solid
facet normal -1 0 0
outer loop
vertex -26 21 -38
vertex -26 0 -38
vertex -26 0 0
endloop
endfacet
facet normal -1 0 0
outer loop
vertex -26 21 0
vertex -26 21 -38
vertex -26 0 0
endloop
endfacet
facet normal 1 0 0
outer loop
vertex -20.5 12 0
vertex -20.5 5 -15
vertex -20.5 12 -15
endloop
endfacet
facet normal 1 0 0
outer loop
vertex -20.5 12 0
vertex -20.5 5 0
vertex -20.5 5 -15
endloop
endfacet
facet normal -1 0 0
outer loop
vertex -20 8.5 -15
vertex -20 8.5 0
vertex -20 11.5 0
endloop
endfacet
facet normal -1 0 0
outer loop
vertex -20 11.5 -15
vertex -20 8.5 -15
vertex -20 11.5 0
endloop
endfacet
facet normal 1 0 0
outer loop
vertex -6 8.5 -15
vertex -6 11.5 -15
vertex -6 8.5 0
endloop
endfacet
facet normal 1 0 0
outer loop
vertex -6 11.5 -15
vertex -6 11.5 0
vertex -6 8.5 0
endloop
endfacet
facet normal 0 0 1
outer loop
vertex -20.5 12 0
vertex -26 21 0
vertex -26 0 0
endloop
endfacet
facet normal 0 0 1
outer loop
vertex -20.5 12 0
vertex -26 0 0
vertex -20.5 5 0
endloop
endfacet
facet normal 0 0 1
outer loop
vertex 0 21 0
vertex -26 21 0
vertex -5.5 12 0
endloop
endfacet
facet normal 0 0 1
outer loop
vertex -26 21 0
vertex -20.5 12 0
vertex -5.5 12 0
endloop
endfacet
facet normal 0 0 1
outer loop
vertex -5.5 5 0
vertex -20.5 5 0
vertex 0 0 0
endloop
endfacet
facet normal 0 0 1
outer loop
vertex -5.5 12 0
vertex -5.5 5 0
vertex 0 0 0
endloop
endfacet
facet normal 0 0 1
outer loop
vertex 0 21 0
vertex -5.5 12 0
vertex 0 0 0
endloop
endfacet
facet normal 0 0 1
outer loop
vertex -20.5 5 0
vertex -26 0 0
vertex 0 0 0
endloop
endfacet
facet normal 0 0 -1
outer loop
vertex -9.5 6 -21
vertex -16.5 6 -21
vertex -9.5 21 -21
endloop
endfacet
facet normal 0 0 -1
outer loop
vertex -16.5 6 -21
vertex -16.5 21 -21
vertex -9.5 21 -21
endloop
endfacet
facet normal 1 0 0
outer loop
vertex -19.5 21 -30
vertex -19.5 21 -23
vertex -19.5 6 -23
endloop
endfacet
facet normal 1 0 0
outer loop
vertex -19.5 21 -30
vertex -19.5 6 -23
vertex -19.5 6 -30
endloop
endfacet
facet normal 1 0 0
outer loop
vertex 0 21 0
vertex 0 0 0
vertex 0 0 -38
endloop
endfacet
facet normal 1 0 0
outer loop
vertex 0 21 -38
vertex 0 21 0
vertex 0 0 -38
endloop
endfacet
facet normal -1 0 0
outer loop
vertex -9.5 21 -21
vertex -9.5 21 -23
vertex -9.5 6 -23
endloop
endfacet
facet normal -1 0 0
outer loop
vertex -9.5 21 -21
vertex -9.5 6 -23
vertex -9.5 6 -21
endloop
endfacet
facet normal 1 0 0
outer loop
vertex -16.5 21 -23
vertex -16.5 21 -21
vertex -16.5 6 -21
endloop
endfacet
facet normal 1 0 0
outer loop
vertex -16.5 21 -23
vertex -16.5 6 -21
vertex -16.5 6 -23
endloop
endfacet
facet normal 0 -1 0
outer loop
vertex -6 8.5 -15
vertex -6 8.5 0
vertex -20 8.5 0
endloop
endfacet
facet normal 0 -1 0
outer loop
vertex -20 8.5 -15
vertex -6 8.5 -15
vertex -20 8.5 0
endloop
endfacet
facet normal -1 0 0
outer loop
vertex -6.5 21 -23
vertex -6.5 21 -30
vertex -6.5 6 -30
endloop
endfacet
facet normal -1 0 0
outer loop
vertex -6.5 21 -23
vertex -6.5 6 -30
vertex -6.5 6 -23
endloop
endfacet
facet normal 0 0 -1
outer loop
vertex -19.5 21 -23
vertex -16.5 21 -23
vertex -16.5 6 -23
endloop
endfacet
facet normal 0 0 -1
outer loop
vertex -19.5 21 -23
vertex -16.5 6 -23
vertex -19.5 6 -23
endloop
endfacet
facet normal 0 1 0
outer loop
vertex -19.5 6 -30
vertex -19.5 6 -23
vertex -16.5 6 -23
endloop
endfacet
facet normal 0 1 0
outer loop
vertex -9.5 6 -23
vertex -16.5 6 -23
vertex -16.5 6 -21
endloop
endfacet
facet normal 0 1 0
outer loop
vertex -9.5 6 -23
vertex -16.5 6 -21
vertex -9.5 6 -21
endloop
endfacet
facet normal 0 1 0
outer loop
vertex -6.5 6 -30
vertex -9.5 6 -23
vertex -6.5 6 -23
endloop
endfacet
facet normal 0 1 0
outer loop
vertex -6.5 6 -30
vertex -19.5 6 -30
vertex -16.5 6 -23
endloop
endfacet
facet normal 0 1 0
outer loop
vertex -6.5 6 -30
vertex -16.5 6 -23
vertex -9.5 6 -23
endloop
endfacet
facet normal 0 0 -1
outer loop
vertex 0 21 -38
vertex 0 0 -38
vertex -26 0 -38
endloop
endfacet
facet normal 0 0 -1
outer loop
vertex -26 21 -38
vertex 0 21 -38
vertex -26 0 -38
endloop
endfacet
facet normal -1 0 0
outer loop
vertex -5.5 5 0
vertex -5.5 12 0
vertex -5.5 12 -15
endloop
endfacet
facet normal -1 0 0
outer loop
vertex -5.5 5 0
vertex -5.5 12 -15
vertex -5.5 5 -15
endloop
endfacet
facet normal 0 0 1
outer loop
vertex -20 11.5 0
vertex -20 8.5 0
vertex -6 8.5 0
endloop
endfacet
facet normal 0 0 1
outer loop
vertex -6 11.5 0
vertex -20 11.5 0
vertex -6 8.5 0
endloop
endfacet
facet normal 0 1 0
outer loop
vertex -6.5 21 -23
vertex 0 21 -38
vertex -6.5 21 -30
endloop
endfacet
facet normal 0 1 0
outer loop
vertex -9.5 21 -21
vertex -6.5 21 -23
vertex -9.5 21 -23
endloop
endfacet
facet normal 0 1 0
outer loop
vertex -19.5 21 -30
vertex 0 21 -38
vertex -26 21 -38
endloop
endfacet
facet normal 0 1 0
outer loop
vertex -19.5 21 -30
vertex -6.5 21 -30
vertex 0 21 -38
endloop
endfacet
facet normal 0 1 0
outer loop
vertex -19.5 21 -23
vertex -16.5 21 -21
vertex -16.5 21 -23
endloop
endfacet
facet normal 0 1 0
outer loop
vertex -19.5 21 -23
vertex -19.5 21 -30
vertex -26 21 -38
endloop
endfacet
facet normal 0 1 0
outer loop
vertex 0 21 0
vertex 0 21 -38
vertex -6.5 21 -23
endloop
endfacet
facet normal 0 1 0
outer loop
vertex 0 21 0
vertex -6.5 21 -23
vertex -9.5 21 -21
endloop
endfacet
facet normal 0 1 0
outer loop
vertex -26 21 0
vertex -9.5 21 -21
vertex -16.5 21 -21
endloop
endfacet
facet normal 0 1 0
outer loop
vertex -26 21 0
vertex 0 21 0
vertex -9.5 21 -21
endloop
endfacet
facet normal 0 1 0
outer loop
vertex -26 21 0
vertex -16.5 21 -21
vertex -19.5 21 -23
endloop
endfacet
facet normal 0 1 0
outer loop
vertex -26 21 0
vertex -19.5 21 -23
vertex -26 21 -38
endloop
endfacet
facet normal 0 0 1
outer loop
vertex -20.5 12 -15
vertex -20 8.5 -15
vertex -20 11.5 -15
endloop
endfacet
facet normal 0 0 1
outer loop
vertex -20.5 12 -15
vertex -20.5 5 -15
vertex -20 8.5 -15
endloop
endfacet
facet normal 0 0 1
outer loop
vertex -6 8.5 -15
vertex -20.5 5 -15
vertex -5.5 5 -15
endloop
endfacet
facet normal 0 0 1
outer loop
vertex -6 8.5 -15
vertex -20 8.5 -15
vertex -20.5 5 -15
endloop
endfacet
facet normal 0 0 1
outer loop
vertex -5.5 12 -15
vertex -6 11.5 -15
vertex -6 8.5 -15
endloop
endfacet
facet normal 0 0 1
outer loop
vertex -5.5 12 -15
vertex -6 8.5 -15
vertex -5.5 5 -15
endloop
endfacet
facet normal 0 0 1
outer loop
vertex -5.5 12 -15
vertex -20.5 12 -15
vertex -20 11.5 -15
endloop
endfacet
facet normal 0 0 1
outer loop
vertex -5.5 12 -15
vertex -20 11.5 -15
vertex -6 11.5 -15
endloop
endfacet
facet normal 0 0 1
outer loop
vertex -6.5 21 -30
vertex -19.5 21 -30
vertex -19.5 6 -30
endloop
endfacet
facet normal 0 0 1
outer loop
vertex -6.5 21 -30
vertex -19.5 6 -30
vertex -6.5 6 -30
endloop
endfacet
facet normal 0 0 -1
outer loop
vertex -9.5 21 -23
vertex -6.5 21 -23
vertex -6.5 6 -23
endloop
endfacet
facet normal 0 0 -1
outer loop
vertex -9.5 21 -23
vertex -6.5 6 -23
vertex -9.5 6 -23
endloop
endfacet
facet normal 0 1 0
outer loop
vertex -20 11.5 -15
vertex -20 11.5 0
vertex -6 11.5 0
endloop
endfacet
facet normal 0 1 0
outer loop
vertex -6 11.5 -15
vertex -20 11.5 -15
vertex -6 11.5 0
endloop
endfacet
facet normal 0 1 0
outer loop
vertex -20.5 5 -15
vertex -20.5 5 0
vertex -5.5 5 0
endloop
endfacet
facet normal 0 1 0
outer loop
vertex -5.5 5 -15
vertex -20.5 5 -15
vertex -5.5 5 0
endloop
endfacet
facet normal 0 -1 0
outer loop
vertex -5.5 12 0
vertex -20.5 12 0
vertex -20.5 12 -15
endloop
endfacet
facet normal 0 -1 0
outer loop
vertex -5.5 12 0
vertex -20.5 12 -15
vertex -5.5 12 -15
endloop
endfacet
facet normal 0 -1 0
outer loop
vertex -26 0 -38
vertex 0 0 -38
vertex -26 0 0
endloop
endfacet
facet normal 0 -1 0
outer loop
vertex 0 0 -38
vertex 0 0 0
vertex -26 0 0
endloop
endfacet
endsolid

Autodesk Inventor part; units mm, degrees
ref_plane "YZ Plane" through (0, 0, 0) normal (1, 0, 0) x (0, 1, 0)
ref_plane "XZ Plane" through (0, 0, 0) normal (0, 1, 0) x (-1, 0, 0)
ref_plane "XY Plane" through (0, 0, 0) normal (0, 0, 1) x (1, 0, 0)
sketch "Sketch1" plane through (0, 0, 0) normal (0, 1, 0) x (-1, 0, 0)
  line L0 (26, 0) -> (0, 0)
  line L1 (0, 0) -> (0, -38)
  line L2 (0, -38) -> (26, -38)
  line L3 (26, -38) -> (26, 0)
  dimension "d0" = 38
  dimension "d1" = 26
extrude "Extrusion1" add sketch "Sketch1" along normal blind 21
sketch "Sketch2" plane through (0, 21, 0) normal (0, 1, 0) x (1, 0, 0)
  line L0 (-19.5, 30) -> (-6.5, 30)
  line L1 (0, 38) -> (-26, 38) projected
  line L2 (-26, 38) -> (-26, 0) projected
  line L3 (-6.5, 30) -> (-6.5, 23)
  line L4 (-13, 30) -> (-13, 10.7779) construction
  line L5 (-16.5, 21) -> (-9.5, 21)
  line L6 (-6.5, 23) -> (-9.5, 23)
  line L7 (-9.5, 23) -> (-9.5, 21)
  line L8 (-16.5, 21) -> (-16.5, 23)
  line L9 (-16.5, 23) -> (-19.5, 23)
  line L10 (-19.5, 23) -> (-19.5, 30)
  point P0 (0, 0)
  point P1 (-13, 21)
  point P2 (-13, 26.5)
  dimension "d4" = 8
  dimension "d5" = 13
  dimension "d6" = 26
  dimension "d7" = 6.5
  dimension "d8" = 7
  dimension "d9" = 7
  dimension "d10" = 2
extrude "Extrusion2" cut sketch "Sketch2" against normal blind 15
sketch "Sketch3" plane through (-26, 0, 0) normal (0, 0, 1) x (1, 0, 0)
  line L0 (5.5, 5) -> (20.5, 5)
  line L1 (0, 0) -> (26, 0) projected
  line L2 (13, 0) -> (13, 33.23) construction
  line L3 (5.5, 5) -> (5.5, 12)
  line L4 (5.5, 12) -> (20.5, 12)
  line L5 (20.5, 12) -> (20.5, 5)
  line L6 (6, 11.5) -> (20, 11.5)
  line L7 (20, 11.5) -> (20, 8.5)
  line L8 (20, 8.5) -> (6, 8.5)
  line L9 (6, 8.5) -> (6, 11.5)
  point P0 (13, 5)
  point P1 (13, 8.5)
  dimension "d13" = 5
  dimension "d14" = 15
  dimension "d15" = 7
  dimension "d16" = 14
  dimension "d17" = 3
  dimension "d18" = 0.5
  dimension "d19" = 0.5
extrude "Extrusion3" cut sketch "Sketch3" against normal blind 15
equation "\"d7\" = -0.5 * d5 + 0.5 * d6"
properties part number "usbRangeExtender"
